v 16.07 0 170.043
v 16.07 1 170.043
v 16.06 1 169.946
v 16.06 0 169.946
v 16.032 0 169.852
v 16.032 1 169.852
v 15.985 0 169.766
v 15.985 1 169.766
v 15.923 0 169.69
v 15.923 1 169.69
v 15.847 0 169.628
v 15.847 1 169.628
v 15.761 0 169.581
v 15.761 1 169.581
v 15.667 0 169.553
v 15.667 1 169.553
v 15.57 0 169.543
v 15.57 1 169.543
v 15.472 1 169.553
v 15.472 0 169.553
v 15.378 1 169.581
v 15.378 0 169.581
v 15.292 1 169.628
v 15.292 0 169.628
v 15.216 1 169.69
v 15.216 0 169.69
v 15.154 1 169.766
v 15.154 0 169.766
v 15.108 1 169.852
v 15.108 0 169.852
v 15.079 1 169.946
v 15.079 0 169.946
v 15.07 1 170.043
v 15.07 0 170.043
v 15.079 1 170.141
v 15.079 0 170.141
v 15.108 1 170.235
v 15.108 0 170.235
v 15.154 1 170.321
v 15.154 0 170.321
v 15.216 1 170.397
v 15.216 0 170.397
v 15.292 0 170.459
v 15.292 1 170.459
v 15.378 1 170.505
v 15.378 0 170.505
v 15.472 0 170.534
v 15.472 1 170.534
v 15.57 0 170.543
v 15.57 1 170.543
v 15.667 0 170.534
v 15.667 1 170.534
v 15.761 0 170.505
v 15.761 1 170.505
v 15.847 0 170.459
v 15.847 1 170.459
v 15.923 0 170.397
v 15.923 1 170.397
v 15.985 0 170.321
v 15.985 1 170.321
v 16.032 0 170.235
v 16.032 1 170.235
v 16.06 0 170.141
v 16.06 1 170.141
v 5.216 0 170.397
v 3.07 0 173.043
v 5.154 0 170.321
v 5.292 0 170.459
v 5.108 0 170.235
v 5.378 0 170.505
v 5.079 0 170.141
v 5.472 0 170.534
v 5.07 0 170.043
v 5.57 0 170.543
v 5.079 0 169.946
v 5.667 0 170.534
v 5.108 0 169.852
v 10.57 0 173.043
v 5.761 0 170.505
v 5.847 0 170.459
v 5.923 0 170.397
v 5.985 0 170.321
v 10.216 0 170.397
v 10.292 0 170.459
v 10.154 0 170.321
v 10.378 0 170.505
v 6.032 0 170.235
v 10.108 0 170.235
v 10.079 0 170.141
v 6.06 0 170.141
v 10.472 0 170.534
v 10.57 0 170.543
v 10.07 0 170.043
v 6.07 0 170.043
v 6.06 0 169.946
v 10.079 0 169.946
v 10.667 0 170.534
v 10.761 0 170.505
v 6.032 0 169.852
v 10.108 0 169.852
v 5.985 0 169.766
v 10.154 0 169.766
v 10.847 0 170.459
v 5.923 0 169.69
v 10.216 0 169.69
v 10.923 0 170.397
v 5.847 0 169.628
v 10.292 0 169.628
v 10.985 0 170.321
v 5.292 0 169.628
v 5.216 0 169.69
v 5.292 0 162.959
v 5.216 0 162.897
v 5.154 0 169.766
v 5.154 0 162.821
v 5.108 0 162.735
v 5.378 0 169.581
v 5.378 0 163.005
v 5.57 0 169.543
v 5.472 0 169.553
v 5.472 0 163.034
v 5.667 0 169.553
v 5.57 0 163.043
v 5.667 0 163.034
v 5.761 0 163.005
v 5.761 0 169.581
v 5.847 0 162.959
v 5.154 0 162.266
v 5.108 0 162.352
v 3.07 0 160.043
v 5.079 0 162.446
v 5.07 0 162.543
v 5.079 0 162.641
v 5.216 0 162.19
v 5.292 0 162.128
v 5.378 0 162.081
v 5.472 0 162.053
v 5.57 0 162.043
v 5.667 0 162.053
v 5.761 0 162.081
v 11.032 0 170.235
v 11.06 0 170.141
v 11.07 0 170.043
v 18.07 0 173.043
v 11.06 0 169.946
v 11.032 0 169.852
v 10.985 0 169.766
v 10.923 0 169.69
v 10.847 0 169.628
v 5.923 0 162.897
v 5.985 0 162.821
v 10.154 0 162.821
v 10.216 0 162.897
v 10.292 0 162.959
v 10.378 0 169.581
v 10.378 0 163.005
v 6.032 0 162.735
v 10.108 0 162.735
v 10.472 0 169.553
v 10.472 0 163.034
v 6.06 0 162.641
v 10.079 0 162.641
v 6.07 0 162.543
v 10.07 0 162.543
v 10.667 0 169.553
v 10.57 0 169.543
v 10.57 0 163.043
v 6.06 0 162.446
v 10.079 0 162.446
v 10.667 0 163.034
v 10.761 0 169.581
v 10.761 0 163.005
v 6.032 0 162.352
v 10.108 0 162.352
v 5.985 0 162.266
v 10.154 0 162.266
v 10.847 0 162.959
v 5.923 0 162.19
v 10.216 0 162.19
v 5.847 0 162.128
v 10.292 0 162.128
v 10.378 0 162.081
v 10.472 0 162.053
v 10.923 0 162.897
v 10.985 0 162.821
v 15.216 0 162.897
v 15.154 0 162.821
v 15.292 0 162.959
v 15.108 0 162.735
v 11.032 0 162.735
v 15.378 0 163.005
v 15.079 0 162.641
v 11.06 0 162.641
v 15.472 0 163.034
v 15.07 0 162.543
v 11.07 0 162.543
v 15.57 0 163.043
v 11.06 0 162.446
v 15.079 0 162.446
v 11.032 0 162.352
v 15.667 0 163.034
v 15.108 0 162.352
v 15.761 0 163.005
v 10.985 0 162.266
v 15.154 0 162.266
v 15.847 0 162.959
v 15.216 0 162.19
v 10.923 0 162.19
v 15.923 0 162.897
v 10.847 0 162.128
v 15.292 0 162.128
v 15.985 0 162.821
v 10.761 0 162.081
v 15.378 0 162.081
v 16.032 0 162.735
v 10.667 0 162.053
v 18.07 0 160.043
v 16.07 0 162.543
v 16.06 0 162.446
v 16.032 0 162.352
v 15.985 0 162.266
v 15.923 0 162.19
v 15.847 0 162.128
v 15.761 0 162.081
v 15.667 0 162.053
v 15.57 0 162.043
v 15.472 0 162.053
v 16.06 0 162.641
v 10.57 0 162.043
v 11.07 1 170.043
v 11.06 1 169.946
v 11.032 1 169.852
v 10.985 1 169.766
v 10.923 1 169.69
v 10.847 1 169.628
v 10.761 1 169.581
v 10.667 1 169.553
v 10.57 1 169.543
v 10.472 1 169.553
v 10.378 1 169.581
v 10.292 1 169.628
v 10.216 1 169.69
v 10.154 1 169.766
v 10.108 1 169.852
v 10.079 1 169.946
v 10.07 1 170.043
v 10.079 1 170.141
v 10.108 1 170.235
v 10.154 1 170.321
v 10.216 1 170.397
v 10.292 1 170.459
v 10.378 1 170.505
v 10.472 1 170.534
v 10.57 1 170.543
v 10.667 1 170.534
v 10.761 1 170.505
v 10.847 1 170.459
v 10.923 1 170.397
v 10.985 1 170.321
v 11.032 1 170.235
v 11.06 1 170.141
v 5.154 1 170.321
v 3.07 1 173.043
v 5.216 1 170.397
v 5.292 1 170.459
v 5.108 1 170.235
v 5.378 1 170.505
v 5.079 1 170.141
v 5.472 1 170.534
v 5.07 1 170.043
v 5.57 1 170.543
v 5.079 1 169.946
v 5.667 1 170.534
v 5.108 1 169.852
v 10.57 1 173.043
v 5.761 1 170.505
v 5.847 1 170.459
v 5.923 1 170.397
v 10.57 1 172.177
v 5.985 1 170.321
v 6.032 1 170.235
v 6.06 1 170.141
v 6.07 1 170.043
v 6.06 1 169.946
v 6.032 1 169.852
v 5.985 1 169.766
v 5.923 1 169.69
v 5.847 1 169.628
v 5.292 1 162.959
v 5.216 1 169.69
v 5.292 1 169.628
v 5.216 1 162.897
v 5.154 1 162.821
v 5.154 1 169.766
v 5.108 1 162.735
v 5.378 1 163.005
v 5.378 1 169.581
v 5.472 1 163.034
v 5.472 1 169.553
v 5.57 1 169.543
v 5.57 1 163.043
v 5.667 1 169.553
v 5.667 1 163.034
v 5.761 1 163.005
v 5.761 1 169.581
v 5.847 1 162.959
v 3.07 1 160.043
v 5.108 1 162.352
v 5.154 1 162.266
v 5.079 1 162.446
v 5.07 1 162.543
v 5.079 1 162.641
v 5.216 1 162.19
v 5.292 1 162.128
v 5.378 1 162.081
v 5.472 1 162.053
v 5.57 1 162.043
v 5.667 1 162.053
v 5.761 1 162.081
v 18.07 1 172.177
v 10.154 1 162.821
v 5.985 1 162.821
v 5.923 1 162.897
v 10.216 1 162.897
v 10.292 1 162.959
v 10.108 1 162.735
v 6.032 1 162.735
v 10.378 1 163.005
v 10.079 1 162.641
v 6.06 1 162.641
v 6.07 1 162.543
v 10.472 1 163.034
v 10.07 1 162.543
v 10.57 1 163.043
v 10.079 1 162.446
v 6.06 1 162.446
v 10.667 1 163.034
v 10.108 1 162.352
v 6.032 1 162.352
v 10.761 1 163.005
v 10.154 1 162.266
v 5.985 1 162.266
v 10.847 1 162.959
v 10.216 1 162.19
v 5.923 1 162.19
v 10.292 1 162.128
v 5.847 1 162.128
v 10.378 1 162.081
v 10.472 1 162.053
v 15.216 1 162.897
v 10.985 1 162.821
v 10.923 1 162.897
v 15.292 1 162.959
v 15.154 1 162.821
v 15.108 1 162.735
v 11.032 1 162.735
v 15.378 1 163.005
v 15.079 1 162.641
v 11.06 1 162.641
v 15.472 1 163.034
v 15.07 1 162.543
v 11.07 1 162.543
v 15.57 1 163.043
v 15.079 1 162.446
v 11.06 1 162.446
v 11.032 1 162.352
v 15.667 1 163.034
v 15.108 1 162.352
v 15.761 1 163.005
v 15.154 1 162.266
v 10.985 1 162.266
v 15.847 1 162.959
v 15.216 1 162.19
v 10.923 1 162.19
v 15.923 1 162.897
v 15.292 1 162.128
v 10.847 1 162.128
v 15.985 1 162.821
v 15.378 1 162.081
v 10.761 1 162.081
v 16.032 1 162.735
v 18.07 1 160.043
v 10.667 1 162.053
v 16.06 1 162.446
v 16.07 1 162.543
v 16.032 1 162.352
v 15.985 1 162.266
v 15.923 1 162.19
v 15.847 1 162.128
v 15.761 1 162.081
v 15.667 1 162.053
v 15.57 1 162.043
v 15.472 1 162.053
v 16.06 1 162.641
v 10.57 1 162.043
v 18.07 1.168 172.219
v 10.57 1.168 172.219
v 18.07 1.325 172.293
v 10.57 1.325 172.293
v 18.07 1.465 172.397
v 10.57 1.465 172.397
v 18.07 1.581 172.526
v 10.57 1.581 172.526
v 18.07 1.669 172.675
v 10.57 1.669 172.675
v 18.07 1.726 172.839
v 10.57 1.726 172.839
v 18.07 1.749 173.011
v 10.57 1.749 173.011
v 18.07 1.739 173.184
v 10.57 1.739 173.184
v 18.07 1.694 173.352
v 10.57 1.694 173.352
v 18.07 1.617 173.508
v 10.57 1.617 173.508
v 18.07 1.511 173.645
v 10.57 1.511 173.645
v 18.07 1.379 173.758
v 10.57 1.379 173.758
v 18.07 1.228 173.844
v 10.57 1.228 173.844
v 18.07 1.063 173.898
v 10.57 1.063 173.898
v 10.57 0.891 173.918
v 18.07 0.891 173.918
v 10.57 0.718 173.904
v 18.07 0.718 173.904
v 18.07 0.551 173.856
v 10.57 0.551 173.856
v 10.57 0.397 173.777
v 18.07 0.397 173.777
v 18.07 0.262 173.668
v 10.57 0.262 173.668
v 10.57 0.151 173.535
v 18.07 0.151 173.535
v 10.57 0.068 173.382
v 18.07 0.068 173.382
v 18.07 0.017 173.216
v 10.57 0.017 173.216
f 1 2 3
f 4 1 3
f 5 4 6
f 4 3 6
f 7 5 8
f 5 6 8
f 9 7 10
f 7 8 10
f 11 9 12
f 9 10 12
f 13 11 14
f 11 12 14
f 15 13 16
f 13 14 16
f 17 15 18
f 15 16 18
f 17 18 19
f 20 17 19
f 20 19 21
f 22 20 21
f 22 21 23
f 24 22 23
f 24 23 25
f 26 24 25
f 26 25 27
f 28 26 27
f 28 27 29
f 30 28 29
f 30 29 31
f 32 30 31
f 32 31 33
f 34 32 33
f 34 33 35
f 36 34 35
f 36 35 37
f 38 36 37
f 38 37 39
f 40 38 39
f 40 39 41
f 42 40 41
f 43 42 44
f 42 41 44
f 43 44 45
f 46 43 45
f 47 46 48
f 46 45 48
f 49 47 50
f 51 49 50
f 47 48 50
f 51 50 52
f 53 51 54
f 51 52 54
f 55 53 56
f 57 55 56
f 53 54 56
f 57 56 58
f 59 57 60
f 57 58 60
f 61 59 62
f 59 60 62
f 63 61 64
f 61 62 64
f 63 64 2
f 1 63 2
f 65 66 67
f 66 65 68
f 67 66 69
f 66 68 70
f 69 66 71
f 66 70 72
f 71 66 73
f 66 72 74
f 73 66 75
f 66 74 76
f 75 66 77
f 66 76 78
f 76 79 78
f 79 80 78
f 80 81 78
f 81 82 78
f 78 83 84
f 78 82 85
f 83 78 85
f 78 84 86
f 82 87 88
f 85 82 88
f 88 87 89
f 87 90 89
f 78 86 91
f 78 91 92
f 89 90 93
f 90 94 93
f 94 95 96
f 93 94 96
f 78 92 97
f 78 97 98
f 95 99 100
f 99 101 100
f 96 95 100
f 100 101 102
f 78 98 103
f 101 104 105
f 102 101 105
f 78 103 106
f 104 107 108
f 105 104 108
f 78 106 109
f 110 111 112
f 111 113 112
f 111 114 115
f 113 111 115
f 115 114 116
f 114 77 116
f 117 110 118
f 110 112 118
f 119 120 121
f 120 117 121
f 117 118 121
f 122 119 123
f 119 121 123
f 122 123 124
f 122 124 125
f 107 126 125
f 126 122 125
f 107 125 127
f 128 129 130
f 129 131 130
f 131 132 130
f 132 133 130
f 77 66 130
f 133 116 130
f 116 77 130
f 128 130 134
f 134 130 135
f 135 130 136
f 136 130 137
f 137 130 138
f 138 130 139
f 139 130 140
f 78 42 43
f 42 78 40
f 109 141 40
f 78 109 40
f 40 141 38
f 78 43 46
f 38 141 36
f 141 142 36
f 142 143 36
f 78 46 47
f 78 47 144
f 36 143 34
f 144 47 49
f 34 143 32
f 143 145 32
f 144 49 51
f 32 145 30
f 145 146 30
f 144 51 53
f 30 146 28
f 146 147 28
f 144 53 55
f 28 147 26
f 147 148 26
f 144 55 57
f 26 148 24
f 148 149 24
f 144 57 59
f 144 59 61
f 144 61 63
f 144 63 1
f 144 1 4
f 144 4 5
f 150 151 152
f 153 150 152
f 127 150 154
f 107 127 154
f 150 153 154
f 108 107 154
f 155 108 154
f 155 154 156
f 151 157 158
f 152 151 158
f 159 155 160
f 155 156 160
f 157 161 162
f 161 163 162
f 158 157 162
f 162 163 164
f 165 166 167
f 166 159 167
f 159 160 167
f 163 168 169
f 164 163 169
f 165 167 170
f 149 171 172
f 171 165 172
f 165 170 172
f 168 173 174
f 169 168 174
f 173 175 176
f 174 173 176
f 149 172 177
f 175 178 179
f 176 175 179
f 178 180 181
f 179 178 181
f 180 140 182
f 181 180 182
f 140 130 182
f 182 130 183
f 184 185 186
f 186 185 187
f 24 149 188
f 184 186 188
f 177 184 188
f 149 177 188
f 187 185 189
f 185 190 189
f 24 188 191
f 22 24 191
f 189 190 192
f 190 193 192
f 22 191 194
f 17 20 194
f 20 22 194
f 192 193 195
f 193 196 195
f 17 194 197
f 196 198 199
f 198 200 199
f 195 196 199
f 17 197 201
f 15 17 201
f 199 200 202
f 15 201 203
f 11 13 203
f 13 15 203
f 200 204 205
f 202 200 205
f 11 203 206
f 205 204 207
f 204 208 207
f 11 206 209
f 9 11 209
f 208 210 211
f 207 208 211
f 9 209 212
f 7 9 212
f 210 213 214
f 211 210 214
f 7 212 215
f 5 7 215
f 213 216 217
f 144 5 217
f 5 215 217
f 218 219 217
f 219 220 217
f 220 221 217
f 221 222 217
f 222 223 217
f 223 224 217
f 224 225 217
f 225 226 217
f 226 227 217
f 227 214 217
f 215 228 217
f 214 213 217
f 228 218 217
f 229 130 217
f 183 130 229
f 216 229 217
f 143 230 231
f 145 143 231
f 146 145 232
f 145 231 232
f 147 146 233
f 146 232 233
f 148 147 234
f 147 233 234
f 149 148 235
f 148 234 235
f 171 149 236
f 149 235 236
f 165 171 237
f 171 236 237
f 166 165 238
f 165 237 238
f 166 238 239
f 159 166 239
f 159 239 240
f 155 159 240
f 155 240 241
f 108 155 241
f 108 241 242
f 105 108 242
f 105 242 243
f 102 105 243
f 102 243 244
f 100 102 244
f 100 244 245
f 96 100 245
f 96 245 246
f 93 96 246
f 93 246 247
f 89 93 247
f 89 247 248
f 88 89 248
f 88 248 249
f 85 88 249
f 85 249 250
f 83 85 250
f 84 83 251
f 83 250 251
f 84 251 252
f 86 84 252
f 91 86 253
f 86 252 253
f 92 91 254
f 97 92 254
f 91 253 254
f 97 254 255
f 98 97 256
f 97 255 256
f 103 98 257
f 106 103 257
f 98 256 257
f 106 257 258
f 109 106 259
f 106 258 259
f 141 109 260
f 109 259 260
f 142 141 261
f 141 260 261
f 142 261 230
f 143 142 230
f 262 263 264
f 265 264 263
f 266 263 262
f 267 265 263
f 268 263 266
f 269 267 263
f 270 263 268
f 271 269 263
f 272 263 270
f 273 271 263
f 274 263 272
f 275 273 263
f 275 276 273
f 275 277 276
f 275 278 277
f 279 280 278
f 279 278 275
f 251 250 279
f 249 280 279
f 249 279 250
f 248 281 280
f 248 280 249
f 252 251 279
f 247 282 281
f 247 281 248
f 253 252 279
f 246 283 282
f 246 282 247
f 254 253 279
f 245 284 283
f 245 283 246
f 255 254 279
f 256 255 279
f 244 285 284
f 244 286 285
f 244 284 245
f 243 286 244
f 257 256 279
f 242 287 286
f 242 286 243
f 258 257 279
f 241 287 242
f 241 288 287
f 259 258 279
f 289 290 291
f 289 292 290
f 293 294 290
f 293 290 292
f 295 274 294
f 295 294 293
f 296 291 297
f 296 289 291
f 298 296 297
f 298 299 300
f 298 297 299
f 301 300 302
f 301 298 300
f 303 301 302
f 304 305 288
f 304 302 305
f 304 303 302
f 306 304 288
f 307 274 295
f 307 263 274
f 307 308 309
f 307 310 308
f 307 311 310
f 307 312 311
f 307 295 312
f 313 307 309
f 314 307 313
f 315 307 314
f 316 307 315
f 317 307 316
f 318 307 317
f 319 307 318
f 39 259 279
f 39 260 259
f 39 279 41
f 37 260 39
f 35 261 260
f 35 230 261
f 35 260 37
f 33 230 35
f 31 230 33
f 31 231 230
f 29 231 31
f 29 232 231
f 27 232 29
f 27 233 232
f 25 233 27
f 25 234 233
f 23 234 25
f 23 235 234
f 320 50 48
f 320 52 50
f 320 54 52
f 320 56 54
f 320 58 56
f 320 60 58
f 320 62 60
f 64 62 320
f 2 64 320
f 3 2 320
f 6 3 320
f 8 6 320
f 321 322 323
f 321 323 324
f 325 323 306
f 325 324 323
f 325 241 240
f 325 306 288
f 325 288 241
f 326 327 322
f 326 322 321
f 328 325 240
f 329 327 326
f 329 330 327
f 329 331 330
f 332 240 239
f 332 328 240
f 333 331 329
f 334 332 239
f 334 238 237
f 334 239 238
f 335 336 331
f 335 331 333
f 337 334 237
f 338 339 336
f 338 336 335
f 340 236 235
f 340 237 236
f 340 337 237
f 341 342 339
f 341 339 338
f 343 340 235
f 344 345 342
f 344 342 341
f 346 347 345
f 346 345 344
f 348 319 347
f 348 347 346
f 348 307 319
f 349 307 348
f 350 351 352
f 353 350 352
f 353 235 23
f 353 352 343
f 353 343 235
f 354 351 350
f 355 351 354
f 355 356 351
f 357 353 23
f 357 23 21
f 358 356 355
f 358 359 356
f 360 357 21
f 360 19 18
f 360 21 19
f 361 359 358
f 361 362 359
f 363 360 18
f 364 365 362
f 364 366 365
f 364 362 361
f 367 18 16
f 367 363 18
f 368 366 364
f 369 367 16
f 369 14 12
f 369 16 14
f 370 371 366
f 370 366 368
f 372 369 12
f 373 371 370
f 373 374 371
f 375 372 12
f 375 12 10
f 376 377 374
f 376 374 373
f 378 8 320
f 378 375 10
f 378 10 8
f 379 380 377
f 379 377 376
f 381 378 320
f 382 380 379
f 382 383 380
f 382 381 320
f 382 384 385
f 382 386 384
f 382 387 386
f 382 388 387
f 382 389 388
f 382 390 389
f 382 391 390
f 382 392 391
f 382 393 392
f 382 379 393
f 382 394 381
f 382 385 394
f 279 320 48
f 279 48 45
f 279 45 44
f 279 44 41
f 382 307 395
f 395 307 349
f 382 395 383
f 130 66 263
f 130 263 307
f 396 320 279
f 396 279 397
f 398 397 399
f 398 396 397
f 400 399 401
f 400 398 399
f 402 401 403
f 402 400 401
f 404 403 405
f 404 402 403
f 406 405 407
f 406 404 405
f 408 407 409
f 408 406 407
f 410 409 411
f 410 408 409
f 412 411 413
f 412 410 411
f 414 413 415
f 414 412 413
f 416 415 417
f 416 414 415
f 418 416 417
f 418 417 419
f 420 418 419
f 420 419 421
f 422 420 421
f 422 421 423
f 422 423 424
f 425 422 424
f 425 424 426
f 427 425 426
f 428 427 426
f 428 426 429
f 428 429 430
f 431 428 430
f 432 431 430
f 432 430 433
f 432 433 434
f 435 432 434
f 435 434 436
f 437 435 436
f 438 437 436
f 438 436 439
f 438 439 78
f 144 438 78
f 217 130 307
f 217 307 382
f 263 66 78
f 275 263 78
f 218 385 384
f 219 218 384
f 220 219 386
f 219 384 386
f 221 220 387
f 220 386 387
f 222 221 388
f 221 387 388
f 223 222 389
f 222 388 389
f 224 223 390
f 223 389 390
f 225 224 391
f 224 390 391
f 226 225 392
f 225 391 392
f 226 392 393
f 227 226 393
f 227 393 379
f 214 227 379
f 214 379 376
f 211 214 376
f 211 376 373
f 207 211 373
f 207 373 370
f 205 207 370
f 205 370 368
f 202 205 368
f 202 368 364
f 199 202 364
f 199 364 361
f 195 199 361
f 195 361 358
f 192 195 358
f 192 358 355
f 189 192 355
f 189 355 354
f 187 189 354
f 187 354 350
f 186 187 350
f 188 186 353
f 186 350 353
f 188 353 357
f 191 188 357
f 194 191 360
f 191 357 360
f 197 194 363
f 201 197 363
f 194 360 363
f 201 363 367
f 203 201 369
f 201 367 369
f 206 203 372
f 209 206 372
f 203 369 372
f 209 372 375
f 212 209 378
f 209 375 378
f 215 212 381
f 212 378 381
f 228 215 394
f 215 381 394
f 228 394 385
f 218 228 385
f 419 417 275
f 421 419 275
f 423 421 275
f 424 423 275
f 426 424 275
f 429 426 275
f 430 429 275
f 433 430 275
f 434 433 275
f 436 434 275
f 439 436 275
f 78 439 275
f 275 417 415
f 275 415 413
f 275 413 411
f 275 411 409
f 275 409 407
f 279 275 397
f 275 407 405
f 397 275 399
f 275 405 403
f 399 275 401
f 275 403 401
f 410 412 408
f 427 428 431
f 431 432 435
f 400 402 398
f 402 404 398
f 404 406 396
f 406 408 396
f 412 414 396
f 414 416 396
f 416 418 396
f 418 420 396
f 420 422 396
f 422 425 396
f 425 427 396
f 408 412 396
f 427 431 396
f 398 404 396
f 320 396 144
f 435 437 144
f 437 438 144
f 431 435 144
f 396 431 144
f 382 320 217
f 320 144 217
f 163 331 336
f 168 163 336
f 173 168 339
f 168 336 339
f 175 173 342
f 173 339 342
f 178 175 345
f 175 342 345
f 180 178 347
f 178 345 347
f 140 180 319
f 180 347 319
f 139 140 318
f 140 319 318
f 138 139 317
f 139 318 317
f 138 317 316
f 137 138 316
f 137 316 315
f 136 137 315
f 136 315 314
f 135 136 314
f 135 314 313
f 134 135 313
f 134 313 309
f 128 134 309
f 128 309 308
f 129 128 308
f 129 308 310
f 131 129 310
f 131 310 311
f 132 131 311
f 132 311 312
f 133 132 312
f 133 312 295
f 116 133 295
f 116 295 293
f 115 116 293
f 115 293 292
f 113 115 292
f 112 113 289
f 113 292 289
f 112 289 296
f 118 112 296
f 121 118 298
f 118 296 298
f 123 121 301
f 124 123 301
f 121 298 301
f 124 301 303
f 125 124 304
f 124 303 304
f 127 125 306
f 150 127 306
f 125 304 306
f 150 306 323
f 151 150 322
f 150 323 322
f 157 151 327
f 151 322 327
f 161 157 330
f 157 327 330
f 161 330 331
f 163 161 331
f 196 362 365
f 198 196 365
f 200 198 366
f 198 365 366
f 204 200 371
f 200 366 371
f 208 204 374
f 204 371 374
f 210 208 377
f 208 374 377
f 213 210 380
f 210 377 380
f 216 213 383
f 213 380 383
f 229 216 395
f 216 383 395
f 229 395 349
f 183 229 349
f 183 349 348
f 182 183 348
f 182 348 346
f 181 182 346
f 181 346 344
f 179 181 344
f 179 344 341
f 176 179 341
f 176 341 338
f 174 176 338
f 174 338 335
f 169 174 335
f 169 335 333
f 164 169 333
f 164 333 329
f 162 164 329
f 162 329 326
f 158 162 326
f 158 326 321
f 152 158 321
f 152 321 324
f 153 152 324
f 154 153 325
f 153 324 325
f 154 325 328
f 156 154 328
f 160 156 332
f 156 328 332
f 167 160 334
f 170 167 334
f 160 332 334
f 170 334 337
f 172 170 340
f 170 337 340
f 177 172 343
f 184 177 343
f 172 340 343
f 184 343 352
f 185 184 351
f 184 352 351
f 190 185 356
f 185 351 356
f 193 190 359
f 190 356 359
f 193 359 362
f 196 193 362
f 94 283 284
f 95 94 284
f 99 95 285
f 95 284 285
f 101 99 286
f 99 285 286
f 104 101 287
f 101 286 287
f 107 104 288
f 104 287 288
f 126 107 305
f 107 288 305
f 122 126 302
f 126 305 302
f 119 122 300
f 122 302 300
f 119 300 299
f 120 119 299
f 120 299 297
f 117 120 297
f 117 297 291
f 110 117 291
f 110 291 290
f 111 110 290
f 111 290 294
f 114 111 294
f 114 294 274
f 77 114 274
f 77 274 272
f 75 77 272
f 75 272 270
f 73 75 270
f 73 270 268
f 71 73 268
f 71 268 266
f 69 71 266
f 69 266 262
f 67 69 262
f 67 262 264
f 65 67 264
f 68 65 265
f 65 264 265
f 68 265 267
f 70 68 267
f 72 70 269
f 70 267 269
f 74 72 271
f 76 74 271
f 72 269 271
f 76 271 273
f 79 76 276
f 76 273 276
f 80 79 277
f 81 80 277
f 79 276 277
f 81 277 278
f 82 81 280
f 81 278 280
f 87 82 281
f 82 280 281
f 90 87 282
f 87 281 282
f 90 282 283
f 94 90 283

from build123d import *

# Parameters (mm, degrees)
SKETCH1_W           = 15
SKETCH1_H           = 13
BOSS_EXTRUDE1_DEPTH = 1
SKETCH2_R           = 0.875
BOSS_EXTRUDE2_DEPTH = 7.5
SKETCH3_R           = 0.5
CUT_EXTRUDE1_DEPTH  = 2


with BuildPart() as part:
    # Sketch1 → Boss-Extrude1 (new body)
    with BuildSketch(Plane(origin=(0, 0, 0), x_dir=(1, 0, 0), z_dir=(0, 1, 0))):
        with Locations((10.569631841, -166.54341444)):
            Rectangle(SKETCH1_W, SKETCH1_H)
    extrude(amount=BOSS_EXTRUDE1_DEPTH)

    # Sketch2 → Boss-Extrude2 (add)
    with BuildSketch(Plane(origin=(18.069631841, 0, 0), x_dir=(0, 0, -1), z_dir=(1, 0, 0))):
        with Locations((-173.04341444, 0.875)):
            Circle(SKETCH2_R)
    extrude(amount=-BOSS_EXTRUDE2_DEPTH)

    # Sketch3 → Cut-Extrude1 (cut, through all)
    with BuildSketch(Plane(origin=(0, 1, 0), x_dir=(1, 0, 0), z_dir=(0, 1, 0))):
        with Locations((15.569631841, -162.54341444)):
            Circle(SKETCH3_R)
        with Locations((15.569631841, -170.04341444)):
            Circle(SKETCH3_R)
        with Locations((10.569631841, -162.54341444)):
            Circle(SKETCH3_R)
        with Locations((10.569631841, -170.04341444)):
            Circle(SKETCH3_R)
        with Locations((5.569631841, -162.54341444)):
            Circle(SKETCH3_R)
        with Locations((5.569631841, -170.04341444)):
            Circle(SKETCH3_R)
    extrude(amount=-CUT_EXTRUDE1_DEPTH, mode=Mode.SUBTRACT)


solid = part.part
